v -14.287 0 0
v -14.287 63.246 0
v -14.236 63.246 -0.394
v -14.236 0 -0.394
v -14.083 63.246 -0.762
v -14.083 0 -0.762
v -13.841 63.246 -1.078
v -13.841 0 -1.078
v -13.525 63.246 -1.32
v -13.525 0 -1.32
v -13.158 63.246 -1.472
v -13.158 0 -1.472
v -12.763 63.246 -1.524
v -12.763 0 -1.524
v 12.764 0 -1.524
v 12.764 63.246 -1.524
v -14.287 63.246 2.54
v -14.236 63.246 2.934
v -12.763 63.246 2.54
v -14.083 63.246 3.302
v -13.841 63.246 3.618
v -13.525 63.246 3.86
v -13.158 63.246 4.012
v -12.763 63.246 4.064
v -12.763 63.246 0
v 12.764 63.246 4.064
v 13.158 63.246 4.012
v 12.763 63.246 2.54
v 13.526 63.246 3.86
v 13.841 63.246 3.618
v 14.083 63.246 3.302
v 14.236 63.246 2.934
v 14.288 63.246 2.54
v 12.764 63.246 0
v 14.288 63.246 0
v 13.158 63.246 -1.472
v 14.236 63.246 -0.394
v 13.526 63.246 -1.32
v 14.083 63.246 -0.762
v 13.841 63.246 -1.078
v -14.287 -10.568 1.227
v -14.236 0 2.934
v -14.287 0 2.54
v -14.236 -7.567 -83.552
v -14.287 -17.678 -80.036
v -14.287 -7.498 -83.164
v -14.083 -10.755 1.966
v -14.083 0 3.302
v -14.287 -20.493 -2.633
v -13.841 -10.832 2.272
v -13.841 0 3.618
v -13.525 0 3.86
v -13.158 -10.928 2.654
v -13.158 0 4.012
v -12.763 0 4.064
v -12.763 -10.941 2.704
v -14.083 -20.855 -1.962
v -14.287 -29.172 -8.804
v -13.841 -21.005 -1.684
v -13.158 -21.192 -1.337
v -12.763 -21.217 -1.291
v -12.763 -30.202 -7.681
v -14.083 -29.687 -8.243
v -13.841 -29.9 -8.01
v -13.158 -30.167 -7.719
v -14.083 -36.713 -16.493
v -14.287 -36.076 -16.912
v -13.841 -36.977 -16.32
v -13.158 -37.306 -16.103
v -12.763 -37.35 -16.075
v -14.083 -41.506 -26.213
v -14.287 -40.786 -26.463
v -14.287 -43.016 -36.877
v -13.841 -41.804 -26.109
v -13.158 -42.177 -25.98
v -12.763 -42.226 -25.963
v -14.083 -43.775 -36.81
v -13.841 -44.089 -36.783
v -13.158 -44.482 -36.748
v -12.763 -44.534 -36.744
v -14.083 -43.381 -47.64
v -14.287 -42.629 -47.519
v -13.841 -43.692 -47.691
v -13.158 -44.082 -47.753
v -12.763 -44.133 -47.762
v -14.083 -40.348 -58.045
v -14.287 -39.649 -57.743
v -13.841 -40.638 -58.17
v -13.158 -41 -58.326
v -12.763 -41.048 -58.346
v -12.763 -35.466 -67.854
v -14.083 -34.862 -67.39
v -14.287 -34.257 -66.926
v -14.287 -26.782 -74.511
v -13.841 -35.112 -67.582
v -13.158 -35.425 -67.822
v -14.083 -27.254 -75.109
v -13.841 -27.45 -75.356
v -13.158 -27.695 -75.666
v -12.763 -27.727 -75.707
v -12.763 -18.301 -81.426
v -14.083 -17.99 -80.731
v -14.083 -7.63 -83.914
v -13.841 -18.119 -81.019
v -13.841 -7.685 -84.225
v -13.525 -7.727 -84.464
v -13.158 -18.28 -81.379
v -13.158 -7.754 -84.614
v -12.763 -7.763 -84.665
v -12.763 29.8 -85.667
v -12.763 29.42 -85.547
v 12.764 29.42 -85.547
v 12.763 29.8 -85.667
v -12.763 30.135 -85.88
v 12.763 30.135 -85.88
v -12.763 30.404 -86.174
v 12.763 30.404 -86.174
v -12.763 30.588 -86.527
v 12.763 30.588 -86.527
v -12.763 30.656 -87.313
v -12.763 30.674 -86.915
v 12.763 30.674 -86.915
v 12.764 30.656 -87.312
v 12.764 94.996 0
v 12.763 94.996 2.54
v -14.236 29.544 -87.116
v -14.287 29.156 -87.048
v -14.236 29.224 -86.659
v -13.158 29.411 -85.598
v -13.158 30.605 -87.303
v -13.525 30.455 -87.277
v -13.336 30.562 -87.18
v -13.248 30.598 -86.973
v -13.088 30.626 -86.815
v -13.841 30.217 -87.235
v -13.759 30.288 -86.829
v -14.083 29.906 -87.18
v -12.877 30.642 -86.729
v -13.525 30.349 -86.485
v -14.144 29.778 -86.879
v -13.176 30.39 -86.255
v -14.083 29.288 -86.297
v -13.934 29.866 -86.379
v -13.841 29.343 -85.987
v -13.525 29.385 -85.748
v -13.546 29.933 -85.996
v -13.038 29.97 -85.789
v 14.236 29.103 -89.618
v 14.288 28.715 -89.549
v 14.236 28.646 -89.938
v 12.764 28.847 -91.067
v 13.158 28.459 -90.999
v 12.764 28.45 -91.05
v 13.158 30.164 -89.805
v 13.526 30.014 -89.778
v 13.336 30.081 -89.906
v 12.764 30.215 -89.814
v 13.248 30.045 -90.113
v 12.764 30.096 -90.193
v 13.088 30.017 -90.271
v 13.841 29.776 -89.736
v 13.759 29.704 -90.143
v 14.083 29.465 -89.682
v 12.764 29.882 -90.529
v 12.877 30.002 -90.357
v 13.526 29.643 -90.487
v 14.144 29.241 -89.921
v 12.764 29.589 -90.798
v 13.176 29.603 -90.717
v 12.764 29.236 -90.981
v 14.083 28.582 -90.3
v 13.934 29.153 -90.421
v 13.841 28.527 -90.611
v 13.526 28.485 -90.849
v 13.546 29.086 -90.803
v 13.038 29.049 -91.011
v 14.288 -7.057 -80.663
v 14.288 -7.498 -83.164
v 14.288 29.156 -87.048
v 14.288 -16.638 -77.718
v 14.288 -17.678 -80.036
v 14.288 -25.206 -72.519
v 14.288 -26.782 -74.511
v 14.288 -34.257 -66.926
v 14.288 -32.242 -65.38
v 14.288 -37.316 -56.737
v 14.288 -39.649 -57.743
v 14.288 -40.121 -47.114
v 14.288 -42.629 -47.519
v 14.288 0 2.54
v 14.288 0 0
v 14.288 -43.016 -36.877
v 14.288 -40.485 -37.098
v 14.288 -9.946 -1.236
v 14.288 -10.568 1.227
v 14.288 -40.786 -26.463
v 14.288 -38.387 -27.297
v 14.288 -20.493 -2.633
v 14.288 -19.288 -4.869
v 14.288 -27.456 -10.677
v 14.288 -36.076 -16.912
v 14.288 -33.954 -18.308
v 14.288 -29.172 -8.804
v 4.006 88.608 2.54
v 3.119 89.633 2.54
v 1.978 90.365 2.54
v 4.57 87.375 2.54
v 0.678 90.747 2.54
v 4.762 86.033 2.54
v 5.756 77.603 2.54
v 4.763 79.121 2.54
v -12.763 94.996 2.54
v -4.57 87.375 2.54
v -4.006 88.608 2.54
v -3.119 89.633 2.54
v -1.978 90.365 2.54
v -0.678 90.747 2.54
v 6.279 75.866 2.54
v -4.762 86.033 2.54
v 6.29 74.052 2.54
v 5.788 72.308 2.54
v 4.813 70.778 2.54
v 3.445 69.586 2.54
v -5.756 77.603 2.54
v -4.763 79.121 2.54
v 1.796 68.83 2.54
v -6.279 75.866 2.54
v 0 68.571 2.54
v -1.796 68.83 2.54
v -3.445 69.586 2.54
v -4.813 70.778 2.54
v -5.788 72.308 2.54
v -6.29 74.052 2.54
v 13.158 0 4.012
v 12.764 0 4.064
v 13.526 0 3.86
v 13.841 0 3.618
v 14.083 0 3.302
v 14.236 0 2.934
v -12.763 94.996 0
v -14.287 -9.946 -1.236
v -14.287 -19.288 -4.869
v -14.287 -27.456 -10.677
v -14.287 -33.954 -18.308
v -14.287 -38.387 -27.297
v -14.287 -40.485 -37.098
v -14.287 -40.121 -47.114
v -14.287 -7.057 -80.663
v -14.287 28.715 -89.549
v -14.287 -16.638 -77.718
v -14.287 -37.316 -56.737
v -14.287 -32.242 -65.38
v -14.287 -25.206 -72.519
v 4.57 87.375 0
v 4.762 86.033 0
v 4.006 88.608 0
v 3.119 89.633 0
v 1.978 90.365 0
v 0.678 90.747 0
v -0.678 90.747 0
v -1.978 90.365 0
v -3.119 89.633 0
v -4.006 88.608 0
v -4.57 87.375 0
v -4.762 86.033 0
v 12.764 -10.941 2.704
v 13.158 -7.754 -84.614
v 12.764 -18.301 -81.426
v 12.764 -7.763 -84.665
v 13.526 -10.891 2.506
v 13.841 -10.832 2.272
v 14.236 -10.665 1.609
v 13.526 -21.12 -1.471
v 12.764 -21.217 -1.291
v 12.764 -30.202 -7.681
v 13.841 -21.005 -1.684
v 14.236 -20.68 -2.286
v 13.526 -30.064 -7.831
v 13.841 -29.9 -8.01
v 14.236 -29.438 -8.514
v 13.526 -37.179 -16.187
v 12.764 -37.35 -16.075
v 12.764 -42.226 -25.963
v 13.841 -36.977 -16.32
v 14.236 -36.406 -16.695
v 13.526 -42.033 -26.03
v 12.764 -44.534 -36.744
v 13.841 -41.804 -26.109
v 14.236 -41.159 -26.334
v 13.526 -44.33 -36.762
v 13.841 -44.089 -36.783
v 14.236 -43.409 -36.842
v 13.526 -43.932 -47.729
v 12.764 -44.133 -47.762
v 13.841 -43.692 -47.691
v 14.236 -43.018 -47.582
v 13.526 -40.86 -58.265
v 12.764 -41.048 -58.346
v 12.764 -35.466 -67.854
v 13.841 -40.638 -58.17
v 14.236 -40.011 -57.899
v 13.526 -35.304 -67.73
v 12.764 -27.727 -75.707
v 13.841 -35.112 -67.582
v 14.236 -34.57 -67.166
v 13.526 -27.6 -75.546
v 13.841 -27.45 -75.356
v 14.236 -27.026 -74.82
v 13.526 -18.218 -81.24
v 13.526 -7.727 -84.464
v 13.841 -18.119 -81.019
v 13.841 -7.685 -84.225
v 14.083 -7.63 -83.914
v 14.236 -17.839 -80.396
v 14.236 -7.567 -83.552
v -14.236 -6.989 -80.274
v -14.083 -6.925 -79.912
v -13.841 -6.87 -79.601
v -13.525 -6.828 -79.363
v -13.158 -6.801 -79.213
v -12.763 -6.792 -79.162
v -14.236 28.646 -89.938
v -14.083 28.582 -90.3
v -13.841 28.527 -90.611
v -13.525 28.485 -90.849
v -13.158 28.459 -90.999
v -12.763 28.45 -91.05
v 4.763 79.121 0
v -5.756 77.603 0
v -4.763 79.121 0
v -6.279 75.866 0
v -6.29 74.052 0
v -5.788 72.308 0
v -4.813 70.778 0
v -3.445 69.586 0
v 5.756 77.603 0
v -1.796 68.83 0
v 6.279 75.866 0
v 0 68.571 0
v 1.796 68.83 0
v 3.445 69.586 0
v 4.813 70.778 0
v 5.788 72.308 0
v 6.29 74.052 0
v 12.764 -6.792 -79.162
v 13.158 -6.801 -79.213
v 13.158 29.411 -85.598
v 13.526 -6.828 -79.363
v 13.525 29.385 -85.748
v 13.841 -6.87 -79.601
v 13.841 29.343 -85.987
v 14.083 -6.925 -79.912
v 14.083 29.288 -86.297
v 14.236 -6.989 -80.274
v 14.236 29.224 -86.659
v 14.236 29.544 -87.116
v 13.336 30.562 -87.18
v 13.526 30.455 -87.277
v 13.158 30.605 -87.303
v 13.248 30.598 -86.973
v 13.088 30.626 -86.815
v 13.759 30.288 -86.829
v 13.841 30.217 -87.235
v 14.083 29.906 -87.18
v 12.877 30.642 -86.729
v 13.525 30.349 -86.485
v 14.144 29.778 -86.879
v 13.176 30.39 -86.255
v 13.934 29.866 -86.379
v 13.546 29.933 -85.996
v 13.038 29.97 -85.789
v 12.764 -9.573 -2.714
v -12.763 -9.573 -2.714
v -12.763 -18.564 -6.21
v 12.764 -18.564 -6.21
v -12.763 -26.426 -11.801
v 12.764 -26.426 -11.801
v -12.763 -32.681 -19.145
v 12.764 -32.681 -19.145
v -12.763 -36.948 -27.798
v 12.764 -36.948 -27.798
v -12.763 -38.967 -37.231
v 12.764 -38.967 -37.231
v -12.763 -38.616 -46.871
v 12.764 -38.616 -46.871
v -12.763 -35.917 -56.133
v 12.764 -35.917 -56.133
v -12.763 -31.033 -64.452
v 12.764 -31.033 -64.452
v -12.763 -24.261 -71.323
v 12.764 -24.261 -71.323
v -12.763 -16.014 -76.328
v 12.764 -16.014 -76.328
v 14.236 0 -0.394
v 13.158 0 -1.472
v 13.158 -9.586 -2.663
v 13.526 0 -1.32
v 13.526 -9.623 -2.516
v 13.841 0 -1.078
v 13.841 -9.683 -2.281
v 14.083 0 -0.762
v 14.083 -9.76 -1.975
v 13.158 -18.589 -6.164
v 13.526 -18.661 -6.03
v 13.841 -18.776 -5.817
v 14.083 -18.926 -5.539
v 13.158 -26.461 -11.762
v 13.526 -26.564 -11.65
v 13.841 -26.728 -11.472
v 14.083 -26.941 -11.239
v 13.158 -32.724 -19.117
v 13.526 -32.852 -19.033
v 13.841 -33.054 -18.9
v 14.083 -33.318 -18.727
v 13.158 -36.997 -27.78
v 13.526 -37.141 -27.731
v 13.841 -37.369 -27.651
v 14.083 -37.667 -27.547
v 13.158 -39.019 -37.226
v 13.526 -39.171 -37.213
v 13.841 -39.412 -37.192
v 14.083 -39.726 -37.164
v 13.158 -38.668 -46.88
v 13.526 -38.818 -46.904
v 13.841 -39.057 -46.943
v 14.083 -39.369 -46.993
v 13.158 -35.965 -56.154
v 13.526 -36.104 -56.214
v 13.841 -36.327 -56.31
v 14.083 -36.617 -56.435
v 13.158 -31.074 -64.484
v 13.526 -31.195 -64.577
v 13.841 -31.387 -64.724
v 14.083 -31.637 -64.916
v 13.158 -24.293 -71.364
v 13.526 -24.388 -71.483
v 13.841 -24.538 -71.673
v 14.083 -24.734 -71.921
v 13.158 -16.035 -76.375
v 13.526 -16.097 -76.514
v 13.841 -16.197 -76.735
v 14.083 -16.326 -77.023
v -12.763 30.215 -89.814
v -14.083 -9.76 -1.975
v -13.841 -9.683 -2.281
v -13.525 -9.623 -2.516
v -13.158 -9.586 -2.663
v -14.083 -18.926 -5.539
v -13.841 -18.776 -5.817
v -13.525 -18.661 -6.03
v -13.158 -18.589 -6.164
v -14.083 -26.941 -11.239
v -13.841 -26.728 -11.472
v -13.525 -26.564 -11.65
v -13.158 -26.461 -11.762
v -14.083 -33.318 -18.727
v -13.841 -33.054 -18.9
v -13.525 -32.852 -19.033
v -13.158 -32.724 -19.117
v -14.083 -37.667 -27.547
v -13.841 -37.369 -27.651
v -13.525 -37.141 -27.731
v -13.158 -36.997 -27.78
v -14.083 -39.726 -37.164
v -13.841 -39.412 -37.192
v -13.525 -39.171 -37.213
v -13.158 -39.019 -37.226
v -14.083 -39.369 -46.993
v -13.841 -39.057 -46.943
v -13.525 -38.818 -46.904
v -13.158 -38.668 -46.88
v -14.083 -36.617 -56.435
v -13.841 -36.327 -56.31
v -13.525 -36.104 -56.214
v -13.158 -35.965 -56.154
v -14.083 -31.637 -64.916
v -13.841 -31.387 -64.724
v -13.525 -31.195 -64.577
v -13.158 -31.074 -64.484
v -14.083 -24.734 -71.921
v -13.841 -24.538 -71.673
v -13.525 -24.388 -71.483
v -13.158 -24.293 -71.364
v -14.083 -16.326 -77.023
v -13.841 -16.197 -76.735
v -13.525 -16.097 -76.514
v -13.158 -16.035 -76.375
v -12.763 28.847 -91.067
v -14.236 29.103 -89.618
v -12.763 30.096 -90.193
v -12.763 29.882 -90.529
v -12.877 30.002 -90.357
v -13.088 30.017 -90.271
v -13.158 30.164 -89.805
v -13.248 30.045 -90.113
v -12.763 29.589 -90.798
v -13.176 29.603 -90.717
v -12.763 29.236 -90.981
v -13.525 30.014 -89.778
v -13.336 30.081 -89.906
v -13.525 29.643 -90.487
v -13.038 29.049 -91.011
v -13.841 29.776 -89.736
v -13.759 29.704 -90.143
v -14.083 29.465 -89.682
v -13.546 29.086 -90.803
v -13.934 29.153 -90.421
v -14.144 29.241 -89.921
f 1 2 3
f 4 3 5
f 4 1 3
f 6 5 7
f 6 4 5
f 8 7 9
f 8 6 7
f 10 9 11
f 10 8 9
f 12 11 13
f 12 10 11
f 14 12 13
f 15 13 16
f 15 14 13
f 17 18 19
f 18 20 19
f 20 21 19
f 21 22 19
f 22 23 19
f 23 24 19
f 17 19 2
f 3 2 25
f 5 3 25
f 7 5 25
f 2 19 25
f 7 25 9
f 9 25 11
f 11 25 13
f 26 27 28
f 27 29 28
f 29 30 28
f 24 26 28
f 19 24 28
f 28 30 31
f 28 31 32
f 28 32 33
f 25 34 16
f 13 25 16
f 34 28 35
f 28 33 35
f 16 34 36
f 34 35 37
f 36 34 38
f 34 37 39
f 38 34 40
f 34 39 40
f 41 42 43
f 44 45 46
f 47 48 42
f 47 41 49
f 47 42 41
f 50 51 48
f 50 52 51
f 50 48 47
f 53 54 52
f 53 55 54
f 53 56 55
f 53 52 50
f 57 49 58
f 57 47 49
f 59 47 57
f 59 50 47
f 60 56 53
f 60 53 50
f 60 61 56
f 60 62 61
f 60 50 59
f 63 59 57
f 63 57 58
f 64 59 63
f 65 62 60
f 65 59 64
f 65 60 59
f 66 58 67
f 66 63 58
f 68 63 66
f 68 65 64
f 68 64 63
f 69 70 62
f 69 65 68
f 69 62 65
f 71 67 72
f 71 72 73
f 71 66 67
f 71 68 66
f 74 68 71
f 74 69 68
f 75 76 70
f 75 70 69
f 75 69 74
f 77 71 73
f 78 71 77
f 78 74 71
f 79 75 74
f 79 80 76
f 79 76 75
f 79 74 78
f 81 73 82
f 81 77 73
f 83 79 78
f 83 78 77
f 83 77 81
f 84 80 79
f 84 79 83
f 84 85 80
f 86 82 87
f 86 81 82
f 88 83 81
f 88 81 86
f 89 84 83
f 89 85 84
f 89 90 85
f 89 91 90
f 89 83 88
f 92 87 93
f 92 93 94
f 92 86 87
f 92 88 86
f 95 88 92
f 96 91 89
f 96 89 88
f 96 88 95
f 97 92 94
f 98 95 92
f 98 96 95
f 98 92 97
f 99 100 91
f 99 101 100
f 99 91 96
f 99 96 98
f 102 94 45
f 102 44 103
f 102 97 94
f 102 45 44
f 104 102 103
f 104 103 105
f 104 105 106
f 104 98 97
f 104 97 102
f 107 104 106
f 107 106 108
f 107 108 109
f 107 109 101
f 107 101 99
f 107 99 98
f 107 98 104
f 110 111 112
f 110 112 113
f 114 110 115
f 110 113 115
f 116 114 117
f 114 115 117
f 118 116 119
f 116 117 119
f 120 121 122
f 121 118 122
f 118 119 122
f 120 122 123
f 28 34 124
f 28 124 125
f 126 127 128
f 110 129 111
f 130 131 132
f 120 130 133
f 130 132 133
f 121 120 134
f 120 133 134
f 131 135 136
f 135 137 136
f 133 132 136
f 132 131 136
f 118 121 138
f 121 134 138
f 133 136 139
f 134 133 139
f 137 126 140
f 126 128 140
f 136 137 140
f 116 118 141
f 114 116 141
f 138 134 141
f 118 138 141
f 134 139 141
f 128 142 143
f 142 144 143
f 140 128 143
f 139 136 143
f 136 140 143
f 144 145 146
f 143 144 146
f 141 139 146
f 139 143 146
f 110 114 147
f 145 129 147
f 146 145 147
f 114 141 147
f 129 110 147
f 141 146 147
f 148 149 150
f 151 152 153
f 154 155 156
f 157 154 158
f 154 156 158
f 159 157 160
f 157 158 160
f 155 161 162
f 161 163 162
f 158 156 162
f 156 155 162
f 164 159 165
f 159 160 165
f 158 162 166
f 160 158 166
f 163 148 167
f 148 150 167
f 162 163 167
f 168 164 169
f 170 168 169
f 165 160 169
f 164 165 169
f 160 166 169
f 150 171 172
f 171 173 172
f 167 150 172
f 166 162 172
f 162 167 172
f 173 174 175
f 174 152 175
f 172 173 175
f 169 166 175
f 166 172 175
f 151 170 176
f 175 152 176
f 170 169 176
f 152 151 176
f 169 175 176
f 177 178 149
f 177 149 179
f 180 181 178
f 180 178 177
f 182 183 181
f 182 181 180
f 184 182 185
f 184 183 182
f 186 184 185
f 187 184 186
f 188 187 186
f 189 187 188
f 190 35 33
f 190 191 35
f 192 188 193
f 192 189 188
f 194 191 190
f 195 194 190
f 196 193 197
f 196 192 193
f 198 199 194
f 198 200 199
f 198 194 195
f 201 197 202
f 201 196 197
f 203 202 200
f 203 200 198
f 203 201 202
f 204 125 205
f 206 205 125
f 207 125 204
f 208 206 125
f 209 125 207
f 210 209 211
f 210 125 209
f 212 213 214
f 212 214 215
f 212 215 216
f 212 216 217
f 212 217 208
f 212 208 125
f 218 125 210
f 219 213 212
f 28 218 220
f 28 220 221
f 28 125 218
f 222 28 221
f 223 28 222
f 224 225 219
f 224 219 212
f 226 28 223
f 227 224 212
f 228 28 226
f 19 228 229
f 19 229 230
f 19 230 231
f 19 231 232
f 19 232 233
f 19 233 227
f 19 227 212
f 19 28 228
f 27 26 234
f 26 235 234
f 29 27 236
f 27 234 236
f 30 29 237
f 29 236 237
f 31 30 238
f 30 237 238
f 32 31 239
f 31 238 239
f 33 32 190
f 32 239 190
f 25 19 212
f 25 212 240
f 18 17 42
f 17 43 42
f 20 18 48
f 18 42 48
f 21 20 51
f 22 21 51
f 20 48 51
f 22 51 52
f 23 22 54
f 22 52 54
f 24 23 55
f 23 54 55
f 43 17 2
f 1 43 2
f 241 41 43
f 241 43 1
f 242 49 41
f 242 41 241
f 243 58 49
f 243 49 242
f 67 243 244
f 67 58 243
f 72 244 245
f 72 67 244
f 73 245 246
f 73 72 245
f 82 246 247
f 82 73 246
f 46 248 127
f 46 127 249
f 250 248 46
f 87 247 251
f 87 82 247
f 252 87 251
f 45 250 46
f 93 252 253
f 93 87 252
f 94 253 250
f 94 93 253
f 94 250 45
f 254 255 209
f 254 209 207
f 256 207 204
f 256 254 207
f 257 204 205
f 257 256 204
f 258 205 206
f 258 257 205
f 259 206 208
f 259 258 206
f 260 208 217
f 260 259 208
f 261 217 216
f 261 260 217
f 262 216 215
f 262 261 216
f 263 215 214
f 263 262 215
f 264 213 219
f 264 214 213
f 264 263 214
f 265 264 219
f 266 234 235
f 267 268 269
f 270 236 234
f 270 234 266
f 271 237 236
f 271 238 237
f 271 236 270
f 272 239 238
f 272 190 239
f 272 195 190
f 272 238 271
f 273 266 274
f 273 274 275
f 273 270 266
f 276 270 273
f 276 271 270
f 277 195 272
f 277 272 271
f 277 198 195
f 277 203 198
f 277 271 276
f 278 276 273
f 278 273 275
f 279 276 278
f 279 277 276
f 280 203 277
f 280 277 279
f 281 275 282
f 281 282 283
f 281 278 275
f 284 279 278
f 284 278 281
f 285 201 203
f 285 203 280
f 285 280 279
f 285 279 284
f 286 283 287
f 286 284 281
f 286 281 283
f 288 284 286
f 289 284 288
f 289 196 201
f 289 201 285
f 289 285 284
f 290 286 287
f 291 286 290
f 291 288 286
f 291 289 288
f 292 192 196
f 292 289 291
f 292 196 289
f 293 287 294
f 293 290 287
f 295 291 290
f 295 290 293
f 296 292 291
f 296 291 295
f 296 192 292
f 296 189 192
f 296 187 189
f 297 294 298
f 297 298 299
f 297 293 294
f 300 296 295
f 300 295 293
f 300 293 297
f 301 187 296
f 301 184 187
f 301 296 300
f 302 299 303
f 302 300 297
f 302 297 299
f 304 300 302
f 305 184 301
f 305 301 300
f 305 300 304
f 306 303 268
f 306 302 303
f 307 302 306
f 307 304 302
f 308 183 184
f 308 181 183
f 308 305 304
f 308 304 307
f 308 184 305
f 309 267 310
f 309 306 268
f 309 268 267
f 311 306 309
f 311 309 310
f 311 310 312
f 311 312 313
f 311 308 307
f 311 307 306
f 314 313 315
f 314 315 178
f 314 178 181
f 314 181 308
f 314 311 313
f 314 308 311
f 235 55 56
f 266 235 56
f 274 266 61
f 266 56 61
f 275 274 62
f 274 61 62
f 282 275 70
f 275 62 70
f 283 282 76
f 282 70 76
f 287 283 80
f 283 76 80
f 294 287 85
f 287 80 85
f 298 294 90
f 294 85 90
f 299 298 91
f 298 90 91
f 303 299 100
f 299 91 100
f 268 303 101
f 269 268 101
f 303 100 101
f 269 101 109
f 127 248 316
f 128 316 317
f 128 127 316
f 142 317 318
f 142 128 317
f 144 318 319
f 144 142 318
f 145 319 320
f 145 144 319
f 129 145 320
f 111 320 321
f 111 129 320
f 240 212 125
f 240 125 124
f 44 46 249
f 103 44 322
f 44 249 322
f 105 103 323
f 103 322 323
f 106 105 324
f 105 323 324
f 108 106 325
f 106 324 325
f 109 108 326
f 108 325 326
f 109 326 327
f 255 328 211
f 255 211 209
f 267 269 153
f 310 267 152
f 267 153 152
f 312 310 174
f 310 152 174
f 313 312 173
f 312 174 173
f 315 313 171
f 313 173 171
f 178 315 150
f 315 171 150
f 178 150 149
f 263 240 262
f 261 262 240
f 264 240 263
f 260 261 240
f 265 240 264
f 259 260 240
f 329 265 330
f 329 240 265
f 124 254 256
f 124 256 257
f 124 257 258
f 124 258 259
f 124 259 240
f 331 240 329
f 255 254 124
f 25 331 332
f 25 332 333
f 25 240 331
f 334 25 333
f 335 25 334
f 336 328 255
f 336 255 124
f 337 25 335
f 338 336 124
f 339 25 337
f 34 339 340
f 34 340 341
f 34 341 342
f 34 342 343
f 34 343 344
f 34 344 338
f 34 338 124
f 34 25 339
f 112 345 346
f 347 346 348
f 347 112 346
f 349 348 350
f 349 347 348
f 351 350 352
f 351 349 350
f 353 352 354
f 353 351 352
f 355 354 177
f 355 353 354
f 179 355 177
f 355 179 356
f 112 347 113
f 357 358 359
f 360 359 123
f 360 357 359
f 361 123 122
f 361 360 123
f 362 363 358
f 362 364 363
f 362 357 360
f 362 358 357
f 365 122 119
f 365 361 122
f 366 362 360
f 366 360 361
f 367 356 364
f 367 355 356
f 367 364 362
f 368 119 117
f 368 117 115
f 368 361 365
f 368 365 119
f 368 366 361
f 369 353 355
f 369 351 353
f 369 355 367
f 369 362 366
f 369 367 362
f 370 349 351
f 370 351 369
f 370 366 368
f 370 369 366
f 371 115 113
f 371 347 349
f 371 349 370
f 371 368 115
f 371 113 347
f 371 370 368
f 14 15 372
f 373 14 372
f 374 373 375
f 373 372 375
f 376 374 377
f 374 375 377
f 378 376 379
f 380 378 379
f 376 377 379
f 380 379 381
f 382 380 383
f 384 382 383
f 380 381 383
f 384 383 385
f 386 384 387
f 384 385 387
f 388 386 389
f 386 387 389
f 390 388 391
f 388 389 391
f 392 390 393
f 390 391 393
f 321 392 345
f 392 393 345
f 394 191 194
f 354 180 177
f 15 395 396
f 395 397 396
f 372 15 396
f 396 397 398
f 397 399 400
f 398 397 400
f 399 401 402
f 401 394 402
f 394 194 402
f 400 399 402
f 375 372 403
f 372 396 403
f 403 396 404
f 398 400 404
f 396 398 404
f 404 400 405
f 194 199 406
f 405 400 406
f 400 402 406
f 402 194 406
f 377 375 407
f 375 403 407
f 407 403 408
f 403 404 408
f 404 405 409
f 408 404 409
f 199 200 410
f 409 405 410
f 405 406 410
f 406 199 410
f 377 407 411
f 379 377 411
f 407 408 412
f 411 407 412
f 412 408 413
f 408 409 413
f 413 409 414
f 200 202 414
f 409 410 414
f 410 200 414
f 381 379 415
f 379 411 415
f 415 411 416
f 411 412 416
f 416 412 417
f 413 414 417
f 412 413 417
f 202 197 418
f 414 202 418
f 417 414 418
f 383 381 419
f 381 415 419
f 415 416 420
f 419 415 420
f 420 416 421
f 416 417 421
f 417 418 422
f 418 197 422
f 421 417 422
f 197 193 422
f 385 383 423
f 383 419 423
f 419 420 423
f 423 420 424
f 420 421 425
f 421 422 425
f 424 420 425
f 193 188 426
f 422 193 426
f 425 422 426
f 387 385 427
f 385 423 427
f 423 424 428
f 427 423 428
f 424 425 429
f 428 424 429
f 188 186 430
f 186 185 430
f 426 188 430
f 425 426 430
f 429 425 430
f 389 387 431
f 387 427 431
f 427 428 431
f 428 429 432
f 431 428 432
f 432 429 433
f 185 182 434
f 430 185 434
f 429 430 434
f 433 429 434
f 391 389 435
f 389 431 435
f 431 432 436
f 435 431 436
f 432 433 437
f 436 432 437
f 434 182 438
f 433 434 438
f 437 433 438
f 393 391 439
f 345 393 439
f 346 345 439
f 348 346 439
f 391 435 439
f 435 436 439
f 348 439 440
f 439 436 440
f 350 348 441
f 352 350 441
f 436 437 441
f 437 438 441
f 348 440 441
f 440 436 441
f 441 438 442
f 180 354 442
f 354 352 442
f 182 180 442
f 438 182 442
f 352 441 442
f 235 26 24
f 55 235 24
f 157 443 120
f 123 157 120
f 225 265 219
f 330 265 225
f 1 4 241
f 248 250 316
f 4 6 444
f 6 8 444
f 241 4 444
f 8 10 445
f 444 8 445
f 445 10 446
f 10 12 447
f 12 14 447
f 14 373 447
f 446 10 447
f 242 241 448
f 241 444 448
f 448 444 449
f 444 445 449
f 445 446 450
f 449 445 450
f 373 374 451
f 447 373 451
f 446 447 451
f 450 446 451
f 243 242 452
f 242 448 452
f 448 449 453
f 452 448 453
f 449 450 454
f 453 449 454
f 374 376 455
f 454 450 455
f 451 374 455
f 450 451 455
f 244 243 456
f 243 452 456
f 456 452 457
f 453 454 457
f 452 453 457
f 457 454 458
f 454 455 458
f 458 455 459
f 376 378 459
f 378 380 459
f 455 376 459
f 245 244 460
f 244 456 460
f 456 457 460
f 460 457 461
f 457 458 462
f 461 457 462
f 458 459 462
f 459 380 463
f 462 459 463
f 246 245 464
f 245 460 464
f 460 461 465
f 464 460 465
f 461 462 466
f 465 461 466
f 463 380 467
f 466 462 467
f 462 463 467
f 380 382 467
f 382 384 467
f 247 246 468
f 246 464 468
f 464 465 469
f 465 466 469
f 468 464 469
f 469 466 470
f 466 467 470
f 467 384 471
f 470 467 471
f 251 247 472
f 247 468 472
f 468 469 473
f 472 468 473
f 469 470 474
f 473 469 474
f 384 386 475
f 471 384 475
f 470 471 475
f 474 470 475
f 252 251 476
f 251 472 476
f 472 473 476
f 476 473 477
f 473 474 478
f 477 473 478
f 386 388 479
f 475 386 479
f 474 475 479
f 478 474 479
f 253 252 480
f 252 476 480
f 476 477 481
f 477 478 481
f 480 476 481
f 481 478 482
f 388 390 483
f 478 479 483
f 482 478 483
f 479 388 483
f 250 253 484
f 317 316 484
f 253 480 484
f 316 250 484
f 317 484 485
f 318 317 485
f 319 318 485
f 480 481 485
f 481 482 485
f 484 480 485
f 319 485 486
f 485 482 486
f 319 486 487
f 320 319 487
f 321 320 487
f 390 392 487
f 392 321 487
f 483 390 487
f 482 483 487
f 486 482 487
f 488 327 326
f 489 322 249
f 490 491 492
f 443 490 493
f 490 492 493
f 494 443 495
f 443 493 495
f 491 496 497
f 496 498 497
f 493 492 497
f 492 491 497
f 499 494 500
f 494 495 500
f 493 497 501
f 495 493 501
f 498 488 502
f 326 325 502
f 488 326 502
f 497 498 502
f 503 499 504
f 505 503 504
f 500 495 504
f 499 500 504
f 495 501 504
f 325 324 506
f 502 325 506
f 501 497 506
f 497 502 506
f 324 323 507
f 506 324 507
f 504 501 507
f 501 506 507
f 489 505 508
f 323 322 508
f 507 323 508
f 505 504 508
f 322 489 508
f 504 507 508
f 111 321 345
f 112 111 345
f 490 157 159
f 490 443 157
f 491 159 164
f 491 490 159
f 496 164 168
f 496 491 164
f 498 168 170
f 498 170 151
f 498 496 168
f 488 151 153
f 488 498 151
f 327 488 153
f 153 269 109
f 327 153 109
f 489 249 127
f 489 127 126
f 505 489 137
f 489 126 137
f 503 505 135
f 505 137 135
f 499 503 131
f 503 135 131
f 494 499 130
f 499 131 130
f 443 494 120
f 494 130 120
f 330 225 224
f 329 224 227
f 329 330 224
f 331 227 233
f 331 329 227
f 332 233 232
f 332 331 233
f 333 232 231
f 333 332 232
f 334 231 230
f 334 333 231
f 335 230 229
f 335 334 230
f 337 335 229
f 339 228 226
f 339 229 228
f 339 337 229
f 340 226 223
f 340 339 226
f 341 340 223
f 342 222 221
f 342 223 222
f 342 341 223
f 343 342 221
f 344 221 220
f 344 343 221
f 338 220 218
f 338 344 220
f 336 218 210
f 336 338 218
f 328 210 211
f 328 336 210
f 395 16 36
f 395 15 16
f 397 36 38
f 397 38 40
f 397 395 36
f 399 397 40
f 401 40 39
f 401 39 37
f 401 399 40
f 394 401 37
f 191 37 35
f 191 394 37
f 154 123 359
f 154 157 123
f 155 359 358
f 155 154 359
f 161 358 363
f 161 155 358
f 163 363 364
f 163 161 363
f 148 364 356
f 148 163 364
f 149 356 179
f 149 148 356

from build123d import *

# Parameters (mm, degrees)
SKETCH6_W          = 28.575
SKETCH6_H          = 5.588000000000008
FILLET1_R          = 1.524
CUT_EXTRUDE1_DEPTH = 133.3733867563125


with BuildPart() as part:
    # Sweep1: sweep along a path in Sketch1
    with BuildLine(Plane(origin=(0, 0, 0), x_dir=(0, 0, -1), z_dir=(1, 0, 0))) as sweep1_path:
        Line((3.9e-16, 94.996), (0, 0))
        ThreePointArc((0, 0), (37.09799061473534, -40.48535253044856), (80.66258708241622, -7.057061940383765))
        Line((80.66258708241622, -7.057061940383765), (87.31250000000001, 30.656468291151832))
    # Sketch2 → Sweep1 (sweep)
    with BuildSketch(Plane(origin=(0, 94.996, -15.113000000000007), x_dir=(1, 0, 0), z_dir=(0, -1, 0))):
        Polygon((-12.763499999999997, 17.653000000000006), (12.763499999999997, 17.65300000000001), (12.763500000000008, 15.113000000000001), (-12.763499999999983, 15.113000000000001), align=None)
    sweep(path=sweep1_path.line)

    # Sweep3: sweep along a path in Sketch5
    with BuildLine(Plane(origin=(0, 0, 0), x_dir=(0, 0, -1), z_dir=(1, 0, 0))) as sweep3_path:
        Line((0, 63.245999999999995), (-3.47e-15, 3.35e-15))
        ThreePointArc((-3.47e-15, 3.35e-15), (37.09799061473534, -40.48535253044856), (80.66258708241622, -7.057061940383765))
        Line((80.66258708241622, -7.057061940383765), (87.31250000000001, 30.656468291151832))
    # Sketch6 → Sweep3 (sweep)
    with BuildSketch(Plane(origin=(0, 44.66337954391292, -7.875358863214053), x_dir=(1, 0, 0), z_dir=(0, 0.9848077530122094, -0.1736481776669233))):
        with Locations((7.11e-15, 81.9325870824162)):
            Rectangle(SKETCH6_W, SKETCH6_H)
        Polygon((-12.763499999999997, 83.2025870824162), (-12.763499999999983, 80.6625870824162), (12.763500000000008, 80.6625870824162), (12.763499999999997, 83.2025870824162), align=None, mode=Mode.SUBTRACT)
    sweep(path=sweep3_path.line)

    # Fillet1
    fillet1_edges = [part.edges().sort_by_distance(p)[0] for p in [
        (-14.287499999999994, 31.622999999999998, -1.5239999999999834),
        (14.287500000000007, 31.622999999999998, 4.064000000000009),
        (-14.287499999999994, -38.96715181055673, -37.23081596668276),
        (14.287500000000007, -44.53388778349341, -36.74378967620887),
        (14.287500000000009, -38.967151810556715, -37.23081596668276),
        (14.287500000000009, 31.622999999999998, -1.5240000000000133),
        (14.287500000000007, 11.09399698134567, -87.98980224944968),
        (14.287500000000009, 12.06434299814844, -82.48669652561743),
        (-14.287499999999996, -44.53388778349341, -36.74378967620887),
        (-14.287499999999996, 31.622999999999998, 4.064000000000009),
        (-14.287499999999994, 12.06434299814843, -82.48669652561752),
        (-14.287499999999996, 11.09399698134567, -87.98980224944968),
        (14.287500000000007, 30.435935105514844, -88.56320584632552),
        (5.33e-15, 29.950762097113483, -91.31475870824151),
        (-14.287499999999994, 30.435935105514847, -88.56320584632554),
        (7.11e-15, 30.92110811391625, -85.81165298440926),
    ]]
    fillet(fillet1_edges, radius=FILLET1_R)

    # Sketch9 → Cut-Extrude1 (cut, through all)
    with BuildSketch(Plane(origin=(0, 0, 0), x_dir=(-1, 0, 0), z_dir=(0, -6e-17, -1))):
        with BuildLine():
            Line((4.7625, 86.03336979368495), (4.762500000000001, 79.121))
            ThreePointArc((4.762500000000001, 79.121), (-7.9e-16, 68.57086979368498), (-4.762500000000001, 79.121))
            Line((-4.762500000000001, 79.121), (-4.7625, 86.03336979368495))
            ThreePointArc((-4.7625, 86.03336979368495), (1.48e-15, 90.79586979368496), (4.7625, 86.03336979368495))
        make_face()
    extrude(amount=-CUT_EXTRUDE1_DEPTH, mode=Mode.SUBTRACT)


solid = part.part
